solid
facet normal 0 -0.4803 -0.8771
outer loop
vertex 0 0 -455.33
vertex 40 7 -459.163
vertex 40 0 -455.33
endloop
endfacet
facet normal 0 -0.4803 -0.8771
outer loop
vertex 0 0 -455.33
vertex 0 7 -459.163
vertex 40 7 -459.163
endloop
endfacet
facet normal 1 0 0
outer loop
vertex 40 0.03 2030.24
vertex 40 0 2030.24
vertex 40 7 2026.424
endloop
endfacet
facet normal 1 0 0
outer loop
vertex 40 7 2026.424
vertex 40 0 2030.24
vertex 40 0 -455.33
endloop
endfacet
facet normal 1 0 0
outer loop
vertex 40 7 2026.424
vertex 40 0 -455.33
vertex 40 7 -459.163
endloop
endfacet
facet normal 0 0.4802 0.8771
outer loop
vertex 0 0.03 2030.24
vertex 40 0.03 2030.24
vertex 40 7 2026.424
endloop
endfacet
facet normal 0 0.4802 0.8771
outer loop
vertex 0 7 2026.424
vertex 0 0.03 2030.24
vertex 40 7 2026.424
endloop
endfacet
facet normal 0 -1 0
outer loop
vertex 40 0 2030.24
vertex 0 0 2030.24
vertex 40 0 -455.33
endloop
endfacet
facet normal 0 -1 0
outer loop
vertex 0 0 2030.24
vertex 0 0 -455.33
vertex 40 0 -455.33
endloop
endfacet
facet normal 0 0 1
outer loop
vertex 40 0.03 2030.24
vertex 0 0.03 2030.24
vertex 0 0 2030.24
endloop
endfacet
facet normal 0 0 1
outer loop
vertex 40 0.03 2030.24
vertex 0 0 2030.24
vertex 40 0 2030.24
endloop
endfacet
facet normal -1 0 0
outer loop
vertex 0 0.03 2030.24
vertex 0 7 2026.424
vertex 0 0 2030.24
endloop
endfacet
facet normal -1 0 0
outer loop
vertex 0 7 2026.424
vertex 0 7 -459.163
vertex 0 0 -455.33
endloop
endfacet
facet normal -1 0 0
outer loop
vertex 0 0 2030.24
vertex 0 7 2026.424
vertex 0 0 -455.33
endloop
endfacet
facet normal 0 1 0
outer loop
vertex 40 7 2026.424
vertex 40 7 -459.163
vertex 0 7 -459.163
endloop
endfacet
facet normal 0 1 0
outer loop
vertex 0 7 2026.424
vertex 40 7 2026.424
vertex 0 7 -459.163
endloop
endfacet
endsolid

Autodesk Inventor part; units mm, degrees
ref_plane "Начальная плоскость" through (0, 0, -459.1772) normal (0, 0, 1) x (1, 0, 0)
ref_plane "Конечная плоскость" through (0, 0, 2030.2398) normal (0, 0, 1) x (1, 0, 0)
sketch "Эскиз" plane through (0, 0, 0) normal (0, 0, 1) x (1, 0, 0)
  line L0 (0, 0) -> (40, 0)
  line L1 (40, 0) -> (40, 7)
  line L2 (40, 7) -> (0, 7)
  line L3 (0, 7) -> (0, 0)
  point P0 (0, 0)
extrude "Тело" add sketch "Эскиз" along normal up to surface (2489.417 mm away) from surface at -459.1772
sketch "Эскиз6" plane through (0, 0, 0) normal (0, 0, 1) x (1, 0, 0)
  line L0 (0, 0) -> (10, 0)
ref_plane "РабПлоскость5" through (0, 0, 0) normal (0, -1, 0) x (1, 0, 0)
sketch "Эскиз7" plane through (0, 0, 0) normal (0, -1, 0) x (1, 0, 0)
  line L0 (-2, -459.1772) -> (12, -459.1772)
  line L1 (-2, 2030.2398) -> (12, 2030.2398)
  dimension "d17" = 2489.417
ref_plane "РабПлоскость6" through (-25, -691.7426, -76.6109) normal (0, -0.4802, -0.8771) x (1, 0, 0)
split "Разделение1" plane through (-25, -691.7426, -76.6109) removes the side toward (0, -0.4802, -0.8771)
ref_plane "РабПлоскость7" through (65, -785.005, 2460.0353) normal (0, 0.4802, 0.8771) x (1, 0, 0)
split "Разделение2" plane through (65, -785.005, 2460.0353) removes the side toward (0, 0.4802, 0.8771)
equation "\"G_OFFSET_START\" = 459.17721"
equation "\"G_OFFSET_END\" = 451.1644"
equation "\"d12\" = -G_OFFSET_START"
equation "\"G_L\" = d17"
equation "\"ДЛИНА\" = 2489.41701"
properties part number "Планка перил 40х7" material "Береза"
